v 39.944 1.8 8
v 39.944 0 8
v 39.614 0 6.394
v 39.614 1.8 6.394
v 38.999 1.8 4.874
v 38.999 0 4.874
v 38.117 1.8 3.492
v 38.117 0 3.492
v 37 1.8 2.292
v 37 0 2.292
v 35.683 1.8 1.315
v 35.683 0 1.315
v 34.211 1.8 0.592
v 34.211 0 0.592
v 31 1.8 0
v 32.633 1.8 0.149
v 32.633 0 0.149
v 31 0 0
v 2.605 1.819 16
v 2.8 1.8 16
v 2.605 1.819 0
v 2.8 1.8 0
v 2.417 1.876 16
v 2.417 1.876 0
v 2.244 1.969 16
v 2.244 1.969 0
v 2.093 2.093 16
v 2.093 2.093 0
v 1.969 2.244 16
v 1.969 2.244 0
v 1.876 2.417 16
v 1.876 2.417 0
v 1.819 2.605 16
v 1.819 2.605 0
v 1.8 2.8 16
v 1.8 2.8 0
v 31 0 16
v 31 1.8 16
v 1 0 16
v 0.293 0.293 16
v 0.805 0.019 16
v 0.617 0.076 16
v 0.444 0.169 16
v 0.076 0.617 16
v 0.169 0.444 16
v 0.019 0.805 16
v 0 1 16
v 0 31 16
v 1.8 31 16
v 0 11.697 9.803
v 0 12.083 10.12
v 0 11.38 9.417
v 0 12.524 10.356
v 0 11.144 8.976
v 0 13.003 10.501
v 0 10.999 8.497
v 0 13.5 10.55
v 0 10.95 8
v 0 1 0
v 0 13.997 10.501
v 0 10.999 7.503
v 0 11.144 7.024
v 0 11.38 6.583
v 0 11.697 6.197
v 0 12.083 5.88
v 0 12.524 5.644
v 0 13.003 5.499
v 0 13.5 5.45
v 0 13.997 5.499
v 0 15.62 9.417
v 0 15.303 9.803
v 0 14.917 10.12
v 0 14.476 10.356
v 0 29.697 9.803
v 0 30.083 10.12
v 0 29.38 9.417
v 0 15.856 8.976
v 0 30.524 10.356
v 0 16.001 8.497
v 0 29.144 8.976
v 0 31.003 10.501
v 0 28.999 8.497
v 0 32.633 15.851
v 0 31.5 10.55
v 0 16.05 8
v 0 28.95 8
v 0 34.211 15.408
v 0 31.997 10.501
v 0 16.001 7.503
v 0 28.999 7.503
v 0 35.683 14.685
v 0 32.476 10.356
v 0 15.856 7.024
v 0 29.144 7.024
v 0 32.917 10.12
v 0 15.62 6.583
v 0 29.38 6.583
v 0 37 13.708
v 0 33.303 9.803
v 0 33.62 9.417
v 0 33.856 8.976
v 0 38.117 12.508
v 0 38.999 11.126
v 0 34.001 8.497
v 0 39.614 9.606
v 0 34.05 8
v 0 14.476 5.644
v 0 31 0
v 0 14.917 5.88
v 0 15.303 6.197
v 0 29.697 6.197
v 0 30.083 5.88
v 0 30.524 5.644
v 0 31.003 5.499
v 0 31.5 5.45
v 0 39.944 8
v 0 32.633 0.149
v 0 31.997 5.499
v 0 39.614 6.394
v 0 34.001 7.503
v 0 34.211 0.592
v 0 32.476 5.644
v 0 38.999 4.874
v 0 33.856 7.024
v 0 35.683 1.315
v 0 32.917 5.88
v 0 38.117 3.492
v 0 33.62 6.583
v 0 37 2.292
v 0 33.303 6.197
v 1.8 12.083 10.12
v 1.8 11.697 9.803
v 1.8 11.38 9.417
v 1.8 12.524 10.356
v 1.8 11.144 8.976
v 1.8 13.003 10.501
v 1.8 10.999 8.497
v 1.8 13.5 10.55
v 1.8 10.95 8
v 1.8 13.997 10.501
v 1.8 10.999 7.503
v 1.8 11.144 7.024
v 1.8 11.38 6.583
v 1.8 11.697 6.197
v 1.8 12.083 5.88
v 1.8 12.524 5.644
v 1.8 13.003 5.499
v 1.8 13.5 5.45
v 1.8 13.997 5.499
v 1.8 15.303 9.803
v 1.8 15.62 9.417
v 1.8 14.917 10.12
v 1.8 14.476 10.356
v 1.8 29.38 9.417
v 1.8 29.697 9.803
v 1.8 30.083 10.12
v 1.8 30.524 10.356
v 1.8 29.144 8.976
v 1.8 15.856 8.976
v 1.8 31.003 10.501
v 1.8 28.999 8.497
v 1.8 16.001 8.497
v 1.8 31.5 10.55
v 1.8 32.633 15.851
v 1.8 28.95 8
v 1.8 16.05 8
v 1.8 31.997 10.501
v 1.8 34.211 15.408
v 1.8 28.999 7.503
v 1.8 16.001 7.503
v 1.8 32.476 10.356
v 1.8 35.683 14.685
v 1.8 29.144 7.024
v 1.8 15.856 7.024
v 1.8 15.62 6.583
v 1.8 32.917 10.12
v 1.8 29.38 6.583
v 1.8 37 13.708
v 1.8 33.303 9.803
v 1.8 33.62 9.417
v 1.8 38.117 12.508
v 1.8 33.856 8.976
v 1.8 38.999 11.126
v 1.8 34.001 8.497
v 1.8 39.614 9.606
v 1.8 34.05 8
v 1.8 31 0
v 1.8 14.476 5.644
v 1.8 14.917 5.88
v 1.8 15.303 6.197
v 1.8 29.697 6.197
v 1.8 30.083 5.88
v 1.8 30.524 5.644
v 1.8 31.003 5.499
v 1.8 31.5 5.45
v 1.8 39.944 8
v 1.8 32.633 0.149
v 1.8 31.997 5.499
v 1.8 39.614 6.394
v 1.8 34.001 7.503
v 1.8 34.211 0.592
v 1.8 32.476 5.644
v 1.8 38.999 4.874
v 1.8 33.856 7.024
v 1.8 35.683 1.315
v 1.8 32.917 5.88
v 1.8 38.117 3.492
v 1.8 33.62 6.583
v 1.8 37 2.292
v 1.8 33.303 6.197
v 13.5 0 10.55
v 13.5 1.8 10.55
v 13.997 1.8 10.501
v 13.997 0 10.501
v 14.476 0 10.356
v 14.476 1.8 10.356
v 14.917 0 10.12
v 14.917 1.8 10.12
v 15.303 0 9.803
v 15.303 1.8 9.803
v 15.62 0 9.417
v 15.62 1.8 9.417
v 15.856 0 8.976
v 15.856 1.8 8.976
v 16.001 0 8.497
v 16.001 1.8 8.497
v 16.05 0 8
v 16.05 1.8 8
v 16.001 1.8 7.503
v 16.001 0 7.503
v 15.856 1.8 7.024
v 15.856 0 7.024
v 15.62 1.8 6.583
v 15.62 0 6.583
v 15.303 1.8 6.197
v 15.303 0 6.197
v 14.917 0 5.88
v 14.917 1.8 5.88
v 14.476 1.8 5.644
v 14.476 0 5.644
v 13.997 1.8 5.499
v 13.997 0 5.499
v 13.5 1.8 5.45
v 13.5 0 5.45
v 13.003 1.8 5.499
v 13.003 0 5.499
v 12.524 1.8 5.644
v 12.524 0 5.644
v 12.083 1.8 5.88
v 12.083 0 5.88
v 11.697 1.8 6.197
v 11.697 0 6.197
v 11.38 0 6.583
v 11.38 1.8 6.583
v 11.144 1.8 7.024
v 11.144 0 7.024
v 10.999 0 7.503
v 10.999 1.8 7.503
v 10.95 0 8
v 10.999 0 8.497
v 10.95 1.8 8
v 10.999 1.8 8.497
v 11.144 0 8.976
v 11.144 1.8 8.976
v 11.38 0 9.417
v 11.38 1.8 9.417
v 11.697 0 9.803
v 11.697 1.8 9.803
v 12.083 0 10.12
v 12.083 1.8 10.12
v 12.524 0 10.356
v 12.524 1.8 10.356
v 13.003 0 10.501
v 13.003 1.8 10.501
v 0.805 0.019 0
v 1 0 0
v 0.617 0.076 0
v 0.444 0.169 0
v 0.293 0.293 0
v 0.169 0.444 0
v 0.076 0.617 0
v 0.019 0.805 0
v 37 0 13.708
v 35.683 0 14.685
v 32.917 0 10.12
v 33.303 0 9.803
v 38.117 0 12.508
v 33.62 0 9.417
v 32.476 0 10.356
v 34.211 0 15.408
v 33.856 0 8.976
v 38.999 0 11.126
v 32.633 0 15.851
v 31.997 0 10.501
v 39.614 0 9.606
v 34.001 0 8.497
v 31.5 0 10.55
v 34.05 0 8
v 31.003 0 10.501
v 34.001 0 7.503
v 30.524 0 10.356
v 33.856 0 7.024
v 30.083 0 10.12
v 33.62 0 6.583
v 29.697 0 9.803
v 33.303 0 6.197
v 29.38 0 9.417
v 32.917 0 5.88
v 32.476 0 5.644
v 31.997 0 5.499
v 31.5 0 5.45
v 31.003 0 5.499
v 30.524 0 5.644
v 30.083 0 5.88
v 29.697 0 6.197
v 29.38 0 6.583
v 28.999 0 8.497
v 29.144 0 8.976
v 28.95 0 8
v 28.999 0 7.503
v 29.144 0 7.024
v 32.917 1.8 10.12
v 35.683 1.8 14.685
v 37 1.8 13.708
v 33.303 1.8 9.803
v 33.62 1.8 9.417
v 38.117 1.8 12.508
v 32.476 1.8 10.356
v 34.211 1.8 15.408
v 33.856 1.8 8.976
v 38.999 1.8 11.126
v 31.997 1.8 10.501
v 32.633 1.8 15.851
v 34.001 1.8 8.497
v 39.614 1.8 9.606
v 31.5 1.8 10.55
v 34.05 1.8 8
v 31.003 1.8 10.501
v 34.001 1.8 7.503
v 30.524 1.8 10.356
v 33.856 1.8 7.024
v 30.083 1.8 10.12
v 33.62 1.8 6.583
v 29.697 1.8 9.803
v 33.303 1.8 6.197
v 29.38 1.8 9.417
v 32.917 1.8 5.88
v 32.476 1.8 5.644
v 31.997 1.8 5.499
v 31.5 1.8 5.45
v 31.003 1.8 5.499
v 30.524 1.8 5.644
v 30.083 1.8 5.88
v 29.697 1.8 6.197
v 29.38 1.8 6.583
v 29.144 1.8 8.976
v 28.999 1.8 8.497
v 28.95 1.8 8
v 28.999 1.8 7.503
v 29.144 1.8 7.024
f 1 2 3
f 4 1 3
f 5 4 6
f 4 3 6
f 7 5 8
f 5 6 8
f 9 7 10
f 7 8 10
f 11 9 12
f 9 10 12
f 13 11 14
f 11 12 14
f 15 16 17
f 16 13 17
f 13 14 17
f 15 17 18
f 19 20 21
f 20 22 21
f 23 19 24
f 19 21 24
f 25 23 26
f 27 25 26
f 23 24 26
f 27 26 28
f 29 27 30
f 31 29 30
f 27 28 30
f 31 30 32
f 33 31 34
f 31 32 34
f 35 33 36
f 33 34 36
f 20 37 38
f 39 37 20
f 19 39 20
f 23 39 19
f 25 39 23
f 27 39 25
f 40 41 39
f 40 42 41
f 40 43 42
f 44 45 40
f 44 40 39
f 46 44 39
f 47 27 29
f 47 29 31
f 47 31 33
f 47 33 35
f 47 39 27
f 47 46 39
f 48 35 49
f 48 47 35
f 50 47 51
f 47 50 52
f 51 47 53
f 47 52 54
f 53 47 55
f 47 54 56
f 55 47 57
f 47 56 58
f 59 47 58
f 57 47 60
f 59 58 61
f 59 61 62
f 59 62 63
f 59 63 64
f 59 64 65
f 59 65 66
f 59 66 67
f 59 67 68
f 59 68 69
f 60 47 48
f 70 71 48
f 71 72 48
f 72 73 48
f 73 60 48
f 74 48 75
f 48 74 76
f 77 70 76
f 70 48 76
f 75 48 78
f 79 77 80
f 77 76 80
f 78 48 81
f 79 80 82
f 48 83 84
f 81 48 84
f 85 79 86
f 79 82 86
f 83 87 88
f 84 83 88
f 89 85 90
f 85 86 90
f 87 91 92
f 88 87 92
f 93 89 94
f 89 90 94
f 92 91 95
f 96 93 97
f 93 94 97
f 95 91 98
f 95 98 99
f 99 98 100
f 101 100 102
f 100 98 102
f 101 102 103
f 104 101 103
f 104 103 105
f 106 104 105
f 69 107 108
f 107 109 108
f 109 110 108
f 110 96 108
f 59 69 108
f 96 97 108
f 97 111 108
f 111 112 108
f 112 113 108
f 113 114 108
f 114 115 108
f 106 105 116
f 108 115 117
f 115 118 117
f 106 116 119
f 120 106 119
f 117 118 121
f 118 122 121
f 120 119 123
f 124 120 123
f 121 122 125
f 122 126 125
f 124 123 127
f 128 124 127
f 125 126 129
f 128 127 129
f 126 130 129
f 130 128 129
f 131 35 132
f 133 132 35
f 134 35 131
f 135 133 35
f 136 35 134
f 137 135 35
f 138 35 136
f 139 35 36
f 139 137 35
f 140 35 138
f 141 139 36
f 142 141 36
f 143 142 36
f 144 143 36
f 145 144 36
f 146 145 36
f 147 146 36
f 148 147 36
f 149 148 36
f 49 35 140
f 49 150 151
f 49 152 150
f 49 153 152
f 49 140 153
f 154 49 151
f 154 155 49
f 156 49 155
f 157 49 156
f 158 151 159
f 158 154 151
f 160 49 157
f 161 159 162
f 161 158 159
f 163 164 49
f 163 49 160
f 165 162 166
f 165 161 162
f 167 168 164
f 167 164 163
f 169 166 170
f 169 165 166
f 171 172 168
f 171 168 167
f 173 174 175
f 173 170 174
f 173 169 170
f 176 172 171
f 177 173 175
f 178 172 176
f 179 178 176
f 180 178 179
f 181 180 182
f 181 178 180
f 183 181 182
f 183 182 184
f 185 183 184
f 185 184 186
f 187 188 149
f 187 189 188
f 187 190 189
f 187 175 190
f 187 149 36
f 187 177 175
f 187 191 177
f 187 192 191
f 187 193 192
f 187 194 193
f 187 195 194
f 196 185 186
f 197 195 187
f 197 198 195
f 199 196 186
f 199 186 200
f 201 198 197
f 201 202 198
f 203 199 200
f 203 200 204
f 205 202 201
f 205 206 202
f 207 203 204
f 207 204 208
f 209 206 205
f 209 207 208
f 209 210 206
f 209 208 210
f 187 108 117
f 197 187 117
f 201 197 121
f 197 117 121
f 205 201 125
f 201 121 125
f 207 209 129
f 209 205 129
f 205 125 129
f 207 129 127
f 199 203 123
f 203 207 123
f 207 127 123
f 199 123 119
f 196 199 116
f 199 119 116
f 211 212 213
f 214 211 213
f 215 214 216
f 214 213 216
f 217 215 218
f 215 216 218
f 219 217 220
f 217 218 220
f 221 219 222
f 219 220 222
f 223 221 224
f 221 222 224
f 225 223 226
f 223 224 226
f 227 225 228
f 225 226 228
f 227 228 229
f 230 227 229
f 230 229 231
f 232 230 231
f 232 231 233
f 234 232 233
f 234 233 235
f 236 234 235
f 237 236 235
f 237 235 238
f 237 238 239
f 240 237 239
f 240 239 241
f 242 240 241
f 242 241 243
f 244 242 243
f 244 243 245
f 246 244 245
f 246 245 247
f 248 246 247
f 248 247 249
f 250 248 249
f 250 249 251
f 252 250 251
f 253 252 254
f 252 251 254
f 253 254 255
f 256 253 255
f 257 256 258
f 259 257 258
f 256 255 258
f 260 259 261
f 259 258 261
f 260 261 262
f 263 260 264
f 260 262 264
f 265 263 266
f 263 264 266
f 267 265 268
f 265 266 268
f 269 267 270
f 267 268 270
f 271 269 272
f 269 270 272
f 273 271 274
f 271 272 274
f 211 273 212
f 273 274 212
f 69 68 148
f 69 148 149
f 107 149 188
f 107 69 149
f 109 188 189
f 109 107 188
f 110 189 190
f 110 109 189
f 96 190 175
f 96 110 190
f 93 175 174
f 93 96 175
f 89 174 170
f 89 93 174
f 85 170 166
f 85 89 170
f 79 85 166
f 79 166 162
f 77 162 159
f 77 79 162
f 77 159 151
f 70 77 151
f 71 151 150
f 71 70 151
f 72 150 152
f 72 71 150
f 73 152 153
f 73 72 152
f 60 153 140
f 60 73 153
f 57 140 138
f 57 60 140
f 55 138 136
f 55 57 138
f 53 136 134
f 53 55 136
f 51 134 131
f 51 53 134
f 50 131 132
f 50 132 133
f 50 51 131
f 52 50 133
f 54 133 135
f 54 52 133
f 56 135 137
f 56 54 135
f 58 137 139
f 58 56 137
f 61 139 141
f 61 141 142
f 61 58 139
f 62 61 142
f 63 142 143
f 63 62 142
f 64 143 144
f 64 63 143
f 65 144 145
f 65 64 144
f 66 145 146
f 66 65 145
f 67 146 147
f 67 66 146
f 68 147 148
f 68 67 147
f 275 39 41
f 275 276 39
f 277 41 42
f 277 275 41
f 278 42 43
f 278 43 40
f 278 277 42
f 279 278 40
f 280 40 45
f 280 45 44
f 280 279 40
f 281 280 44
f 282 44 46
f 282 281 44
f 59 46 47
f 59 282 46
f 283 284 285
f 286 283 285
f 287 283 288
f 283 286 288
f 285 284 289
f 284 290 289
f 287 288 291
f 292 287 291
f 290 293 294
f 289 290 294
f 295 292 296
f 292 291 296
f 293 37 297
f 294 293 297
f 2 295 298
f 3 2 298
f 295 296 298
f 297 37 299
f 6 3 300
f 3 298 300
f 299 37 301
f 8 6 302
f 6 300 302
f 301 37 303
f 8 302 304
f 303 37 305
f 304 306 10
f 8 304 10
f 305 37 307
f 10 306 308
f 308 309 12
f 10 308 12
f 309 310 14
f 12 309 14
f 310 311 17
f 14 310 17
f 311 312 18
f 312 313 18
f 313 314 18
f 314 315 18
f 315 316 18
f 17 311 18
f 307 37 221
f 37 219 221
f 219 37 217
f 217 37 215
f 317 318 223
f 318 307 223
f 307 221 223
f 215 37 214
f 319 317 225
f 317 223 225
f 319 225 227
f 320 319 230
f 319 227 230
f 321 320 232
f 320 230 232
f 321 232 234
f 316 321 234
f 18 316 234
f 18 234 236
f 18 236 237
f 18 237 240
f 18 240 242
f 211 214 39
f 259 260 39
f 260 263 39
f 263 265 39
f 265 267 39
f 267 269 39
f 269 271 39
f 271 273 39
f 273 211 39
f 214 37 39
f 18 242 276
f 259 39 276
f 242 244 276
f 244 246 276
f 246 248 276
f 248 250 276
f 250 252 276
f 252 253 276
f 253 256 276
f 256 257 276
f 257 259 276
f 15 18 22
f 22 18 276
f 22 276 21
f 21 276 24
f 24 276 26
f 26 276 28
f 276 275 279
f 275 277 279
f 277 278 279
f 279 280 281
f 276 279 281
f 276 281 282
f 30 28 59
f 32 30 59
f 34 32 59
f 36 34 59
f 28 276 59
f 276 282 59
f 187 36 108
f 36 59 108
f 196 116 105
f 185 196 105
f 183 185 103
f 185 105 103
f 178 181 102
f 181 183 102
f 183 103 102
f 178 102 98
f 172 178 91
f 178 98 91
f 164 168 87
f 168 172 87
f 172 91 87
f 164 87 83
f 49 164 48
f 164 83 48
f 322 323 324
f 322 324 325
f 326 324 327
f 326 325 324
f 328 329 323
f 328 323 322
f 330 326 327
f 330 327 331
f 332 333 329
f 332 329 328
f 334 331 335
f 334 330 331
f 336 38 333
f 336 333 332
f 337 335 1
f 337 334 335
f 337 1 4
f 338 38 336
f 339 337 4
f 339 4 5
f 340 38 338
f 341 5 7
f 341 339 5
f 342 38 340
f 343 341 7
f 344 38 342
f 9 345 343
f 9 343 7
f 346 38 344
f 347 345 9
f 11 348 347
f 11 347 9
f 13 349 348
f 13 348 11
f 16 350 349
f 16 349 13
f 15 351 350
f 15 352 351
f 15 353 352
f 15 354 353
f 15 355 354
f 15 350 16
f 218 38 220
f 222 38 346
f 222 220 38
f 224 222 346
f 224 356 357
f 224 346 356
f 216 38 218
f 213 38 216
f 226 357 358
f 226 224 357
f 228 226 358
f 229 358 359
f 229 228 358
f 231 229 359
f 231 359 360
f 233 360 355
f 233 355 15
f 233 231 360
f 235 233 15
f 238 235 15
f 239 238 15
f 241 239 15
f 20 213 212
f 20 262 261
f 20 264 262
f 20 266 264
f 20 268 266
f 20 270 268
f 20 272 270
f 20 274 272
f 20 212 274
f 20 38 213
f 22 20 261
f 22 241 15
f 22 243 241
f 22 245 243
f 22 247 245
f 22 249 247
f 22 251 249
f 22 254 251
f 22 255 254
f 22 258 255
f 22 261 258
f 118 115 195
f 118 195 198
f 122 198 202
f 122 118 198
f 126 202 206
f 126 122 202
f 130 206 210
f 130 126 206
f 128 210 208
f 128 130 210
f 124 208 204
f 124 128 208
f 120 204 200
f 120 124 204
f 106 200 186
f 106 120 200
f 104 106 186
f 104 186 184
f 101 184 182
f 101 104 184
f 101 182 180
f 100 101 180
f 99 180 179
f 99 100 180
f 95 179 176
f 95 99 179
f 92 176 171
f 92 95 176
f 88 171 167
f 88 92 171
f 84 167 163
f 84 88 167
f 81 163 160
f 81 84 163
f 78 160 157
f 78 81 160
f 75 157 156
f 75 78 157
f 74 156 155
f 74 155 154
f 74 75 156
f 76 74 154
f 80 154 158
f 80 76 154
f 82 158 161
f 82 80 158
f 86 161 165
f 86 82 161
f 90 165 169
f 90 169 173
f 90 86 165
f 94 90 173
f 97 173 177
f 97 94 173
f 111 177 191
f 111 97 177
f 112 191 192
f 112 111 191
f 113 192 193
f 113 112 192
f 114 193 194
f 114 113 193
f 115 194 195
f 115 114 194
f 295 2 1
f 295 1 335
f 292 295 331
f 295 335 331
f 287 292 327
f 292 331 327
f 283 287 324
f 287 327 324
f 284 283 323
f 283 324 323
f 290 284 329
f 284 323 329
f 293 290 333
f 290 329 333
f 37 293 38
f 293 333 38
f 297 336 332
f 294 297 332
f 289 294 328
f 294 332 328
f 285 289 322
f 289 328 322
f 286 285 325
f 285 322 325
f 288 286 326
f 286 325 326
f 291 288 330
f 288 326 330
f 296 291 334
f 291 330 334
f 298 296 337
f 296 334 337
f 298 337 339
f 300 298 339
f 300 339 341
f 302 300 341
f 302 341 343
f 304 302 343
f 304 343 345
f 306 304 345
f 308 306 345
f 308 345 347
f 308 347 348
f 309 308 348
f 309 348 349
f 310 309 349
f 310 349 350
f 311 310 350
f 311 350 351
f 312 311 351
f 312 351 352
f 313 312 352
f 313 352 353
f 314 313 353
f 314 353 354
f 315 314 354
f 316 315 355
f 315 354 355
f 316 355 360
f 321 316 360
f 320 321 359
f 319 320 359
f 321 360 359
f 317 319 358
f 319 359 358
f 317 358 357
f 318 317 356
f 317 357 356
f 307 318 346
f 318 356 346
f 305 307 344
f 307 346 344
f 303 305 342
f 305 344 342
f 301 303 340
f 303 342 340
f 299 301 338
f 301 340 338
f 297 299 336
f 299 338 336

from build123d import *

# Parameters (mm, degrees)
CROQUIS1_W              = 16
CROQUIS1_H              = 40
CROQUIS1_R              = 2.55
SALIENTE_EXTRUIR1_DEPTH = 1.8
CROQUIS2_W              = 16
CROQUIS2_H              = 1.8
SALIENTE_EXTRUIR2_DEPTH = 38.2
CROQUIS3_R              = 2.55
CORTAR_EXTRUIR1_DEPTH   = 38.2
REDONDEO1_R             = 1
REDONDEO2_R             = 9
REDONDEO3_R             = 1


with BuildPart() as part:
    # Croquis1 → Saliente-Extruir1 (new body)
    with BuildSketch(Plane(origin=(0, 0, 0), x_dir=(0, 0, -1), z_dir=(1, 0, 0))):
        with Locations((-8, 20)):
            Rectangle(CROQUIS1_W, CROQUIS1_H)
        with Locations((-8, 31.5)):
            Circle(CROQUIS1_R, mode=Mode.SUBTRACT)
        with Locations((-8, 13.5)):
            Circle(CROQUIS1_R, mode=Mode.SUBTRACT)
    extrude(amount=SALIENTE_EXTRUIR1_DEPTH)

    # Croquis2 → Saliente-Extruir2 (add)
    with BuildSketch(Plane(origin=(1.8, 0, 0), x_dir=(0, 0, -1), z_dir=(1, 0, 0))):
        with Locations((-8, 0.9)):
            Rectangle(CROQUIS2_W, CROQUIS2_H)
    extrude(amount=SALIENTE_EXTRUIR2_DEPTH)

    # Croquis3 → Cortar-Extruir1 (cut)
    with BuildSketch(Plane(origin=(0, 1.8, 0), x_dir=(1, 0, 0), z_dir=(0, 1, 0))):
        with Locations(Location((31.5, -8, 0), (0, 0, 270))):
            Circle(CROQUIS3_R)
        with Locations(Location((13.5, -8, 0), (0, 0, 270))):
            Circle(CROQUIS3_R)
    extrude(amount=-CORTAR_EXTRUIR1_DEPTH, mode=Mode.SUBTRACT)

    # Redondeo1
    redondeo1_edges = [part.edges().sort_by_distance(p)[0] for p in [
        (1.8, 1.8, 8),
    ]]
    fillet(redondeo1_edges, radius=REDONDEO1_R)

    # Redondeo2
    # the kernel refuses this fillet: 9 mm, written as the material it takes off along each edge
    with BuildSketch(Plane(origin=(40, 24.3, 16), x_dir=(0, 0, -1), z_dir=(0, -1, 0)), Plane(origin=(-22.5, 40, 0), x_dir=(0, -1, 0), z_dir=(1, 0, 0)), Plane(origin=(-22.5, 40, 16), x_dir=(0, 0, -1), z_dir=(1, 0, 0))) as redondeo2_piece_1:
        with BuildLine():
            CenterArc((REDONDEO2_R, -REDONDEO2_R), REDONDEO2_R, 90, 90)
            Line((0, -REDONDEO2_R), (0, 0))
            Line((0, 0), (REDONDEO2_R, 0))
        make_face()
    extrude(amount=46.8, mode=Mode.SUBTRACT)
    with BuildSketch(Plane(origin=(40, -22.5, 0), x_dir=(-1, 0, 0), z_dir=(0, 1, 0))) as redondeo2_piece_2:
        with BuildLine():
            CenterArc((REDONDEO2_R, REDONDEO2_R), REDONDEO2_R, 180, 90)
            Line((0, REDONDEO2_R), (0, 0))
            Line((0, 0), (REDONDEO2_R, 0))
        make_face()
    extrude(amount=46.8, mode=Mode.SUBTRACT)

    # Redondeo3
    redondeo3_edges = [part.edges().sort_by_distance(p)[0] for p in [
        (0, 0, 8),
    ]]
    fillet(redondeo3_edges, radius=REDONDEO3_R)


solid = part.part
